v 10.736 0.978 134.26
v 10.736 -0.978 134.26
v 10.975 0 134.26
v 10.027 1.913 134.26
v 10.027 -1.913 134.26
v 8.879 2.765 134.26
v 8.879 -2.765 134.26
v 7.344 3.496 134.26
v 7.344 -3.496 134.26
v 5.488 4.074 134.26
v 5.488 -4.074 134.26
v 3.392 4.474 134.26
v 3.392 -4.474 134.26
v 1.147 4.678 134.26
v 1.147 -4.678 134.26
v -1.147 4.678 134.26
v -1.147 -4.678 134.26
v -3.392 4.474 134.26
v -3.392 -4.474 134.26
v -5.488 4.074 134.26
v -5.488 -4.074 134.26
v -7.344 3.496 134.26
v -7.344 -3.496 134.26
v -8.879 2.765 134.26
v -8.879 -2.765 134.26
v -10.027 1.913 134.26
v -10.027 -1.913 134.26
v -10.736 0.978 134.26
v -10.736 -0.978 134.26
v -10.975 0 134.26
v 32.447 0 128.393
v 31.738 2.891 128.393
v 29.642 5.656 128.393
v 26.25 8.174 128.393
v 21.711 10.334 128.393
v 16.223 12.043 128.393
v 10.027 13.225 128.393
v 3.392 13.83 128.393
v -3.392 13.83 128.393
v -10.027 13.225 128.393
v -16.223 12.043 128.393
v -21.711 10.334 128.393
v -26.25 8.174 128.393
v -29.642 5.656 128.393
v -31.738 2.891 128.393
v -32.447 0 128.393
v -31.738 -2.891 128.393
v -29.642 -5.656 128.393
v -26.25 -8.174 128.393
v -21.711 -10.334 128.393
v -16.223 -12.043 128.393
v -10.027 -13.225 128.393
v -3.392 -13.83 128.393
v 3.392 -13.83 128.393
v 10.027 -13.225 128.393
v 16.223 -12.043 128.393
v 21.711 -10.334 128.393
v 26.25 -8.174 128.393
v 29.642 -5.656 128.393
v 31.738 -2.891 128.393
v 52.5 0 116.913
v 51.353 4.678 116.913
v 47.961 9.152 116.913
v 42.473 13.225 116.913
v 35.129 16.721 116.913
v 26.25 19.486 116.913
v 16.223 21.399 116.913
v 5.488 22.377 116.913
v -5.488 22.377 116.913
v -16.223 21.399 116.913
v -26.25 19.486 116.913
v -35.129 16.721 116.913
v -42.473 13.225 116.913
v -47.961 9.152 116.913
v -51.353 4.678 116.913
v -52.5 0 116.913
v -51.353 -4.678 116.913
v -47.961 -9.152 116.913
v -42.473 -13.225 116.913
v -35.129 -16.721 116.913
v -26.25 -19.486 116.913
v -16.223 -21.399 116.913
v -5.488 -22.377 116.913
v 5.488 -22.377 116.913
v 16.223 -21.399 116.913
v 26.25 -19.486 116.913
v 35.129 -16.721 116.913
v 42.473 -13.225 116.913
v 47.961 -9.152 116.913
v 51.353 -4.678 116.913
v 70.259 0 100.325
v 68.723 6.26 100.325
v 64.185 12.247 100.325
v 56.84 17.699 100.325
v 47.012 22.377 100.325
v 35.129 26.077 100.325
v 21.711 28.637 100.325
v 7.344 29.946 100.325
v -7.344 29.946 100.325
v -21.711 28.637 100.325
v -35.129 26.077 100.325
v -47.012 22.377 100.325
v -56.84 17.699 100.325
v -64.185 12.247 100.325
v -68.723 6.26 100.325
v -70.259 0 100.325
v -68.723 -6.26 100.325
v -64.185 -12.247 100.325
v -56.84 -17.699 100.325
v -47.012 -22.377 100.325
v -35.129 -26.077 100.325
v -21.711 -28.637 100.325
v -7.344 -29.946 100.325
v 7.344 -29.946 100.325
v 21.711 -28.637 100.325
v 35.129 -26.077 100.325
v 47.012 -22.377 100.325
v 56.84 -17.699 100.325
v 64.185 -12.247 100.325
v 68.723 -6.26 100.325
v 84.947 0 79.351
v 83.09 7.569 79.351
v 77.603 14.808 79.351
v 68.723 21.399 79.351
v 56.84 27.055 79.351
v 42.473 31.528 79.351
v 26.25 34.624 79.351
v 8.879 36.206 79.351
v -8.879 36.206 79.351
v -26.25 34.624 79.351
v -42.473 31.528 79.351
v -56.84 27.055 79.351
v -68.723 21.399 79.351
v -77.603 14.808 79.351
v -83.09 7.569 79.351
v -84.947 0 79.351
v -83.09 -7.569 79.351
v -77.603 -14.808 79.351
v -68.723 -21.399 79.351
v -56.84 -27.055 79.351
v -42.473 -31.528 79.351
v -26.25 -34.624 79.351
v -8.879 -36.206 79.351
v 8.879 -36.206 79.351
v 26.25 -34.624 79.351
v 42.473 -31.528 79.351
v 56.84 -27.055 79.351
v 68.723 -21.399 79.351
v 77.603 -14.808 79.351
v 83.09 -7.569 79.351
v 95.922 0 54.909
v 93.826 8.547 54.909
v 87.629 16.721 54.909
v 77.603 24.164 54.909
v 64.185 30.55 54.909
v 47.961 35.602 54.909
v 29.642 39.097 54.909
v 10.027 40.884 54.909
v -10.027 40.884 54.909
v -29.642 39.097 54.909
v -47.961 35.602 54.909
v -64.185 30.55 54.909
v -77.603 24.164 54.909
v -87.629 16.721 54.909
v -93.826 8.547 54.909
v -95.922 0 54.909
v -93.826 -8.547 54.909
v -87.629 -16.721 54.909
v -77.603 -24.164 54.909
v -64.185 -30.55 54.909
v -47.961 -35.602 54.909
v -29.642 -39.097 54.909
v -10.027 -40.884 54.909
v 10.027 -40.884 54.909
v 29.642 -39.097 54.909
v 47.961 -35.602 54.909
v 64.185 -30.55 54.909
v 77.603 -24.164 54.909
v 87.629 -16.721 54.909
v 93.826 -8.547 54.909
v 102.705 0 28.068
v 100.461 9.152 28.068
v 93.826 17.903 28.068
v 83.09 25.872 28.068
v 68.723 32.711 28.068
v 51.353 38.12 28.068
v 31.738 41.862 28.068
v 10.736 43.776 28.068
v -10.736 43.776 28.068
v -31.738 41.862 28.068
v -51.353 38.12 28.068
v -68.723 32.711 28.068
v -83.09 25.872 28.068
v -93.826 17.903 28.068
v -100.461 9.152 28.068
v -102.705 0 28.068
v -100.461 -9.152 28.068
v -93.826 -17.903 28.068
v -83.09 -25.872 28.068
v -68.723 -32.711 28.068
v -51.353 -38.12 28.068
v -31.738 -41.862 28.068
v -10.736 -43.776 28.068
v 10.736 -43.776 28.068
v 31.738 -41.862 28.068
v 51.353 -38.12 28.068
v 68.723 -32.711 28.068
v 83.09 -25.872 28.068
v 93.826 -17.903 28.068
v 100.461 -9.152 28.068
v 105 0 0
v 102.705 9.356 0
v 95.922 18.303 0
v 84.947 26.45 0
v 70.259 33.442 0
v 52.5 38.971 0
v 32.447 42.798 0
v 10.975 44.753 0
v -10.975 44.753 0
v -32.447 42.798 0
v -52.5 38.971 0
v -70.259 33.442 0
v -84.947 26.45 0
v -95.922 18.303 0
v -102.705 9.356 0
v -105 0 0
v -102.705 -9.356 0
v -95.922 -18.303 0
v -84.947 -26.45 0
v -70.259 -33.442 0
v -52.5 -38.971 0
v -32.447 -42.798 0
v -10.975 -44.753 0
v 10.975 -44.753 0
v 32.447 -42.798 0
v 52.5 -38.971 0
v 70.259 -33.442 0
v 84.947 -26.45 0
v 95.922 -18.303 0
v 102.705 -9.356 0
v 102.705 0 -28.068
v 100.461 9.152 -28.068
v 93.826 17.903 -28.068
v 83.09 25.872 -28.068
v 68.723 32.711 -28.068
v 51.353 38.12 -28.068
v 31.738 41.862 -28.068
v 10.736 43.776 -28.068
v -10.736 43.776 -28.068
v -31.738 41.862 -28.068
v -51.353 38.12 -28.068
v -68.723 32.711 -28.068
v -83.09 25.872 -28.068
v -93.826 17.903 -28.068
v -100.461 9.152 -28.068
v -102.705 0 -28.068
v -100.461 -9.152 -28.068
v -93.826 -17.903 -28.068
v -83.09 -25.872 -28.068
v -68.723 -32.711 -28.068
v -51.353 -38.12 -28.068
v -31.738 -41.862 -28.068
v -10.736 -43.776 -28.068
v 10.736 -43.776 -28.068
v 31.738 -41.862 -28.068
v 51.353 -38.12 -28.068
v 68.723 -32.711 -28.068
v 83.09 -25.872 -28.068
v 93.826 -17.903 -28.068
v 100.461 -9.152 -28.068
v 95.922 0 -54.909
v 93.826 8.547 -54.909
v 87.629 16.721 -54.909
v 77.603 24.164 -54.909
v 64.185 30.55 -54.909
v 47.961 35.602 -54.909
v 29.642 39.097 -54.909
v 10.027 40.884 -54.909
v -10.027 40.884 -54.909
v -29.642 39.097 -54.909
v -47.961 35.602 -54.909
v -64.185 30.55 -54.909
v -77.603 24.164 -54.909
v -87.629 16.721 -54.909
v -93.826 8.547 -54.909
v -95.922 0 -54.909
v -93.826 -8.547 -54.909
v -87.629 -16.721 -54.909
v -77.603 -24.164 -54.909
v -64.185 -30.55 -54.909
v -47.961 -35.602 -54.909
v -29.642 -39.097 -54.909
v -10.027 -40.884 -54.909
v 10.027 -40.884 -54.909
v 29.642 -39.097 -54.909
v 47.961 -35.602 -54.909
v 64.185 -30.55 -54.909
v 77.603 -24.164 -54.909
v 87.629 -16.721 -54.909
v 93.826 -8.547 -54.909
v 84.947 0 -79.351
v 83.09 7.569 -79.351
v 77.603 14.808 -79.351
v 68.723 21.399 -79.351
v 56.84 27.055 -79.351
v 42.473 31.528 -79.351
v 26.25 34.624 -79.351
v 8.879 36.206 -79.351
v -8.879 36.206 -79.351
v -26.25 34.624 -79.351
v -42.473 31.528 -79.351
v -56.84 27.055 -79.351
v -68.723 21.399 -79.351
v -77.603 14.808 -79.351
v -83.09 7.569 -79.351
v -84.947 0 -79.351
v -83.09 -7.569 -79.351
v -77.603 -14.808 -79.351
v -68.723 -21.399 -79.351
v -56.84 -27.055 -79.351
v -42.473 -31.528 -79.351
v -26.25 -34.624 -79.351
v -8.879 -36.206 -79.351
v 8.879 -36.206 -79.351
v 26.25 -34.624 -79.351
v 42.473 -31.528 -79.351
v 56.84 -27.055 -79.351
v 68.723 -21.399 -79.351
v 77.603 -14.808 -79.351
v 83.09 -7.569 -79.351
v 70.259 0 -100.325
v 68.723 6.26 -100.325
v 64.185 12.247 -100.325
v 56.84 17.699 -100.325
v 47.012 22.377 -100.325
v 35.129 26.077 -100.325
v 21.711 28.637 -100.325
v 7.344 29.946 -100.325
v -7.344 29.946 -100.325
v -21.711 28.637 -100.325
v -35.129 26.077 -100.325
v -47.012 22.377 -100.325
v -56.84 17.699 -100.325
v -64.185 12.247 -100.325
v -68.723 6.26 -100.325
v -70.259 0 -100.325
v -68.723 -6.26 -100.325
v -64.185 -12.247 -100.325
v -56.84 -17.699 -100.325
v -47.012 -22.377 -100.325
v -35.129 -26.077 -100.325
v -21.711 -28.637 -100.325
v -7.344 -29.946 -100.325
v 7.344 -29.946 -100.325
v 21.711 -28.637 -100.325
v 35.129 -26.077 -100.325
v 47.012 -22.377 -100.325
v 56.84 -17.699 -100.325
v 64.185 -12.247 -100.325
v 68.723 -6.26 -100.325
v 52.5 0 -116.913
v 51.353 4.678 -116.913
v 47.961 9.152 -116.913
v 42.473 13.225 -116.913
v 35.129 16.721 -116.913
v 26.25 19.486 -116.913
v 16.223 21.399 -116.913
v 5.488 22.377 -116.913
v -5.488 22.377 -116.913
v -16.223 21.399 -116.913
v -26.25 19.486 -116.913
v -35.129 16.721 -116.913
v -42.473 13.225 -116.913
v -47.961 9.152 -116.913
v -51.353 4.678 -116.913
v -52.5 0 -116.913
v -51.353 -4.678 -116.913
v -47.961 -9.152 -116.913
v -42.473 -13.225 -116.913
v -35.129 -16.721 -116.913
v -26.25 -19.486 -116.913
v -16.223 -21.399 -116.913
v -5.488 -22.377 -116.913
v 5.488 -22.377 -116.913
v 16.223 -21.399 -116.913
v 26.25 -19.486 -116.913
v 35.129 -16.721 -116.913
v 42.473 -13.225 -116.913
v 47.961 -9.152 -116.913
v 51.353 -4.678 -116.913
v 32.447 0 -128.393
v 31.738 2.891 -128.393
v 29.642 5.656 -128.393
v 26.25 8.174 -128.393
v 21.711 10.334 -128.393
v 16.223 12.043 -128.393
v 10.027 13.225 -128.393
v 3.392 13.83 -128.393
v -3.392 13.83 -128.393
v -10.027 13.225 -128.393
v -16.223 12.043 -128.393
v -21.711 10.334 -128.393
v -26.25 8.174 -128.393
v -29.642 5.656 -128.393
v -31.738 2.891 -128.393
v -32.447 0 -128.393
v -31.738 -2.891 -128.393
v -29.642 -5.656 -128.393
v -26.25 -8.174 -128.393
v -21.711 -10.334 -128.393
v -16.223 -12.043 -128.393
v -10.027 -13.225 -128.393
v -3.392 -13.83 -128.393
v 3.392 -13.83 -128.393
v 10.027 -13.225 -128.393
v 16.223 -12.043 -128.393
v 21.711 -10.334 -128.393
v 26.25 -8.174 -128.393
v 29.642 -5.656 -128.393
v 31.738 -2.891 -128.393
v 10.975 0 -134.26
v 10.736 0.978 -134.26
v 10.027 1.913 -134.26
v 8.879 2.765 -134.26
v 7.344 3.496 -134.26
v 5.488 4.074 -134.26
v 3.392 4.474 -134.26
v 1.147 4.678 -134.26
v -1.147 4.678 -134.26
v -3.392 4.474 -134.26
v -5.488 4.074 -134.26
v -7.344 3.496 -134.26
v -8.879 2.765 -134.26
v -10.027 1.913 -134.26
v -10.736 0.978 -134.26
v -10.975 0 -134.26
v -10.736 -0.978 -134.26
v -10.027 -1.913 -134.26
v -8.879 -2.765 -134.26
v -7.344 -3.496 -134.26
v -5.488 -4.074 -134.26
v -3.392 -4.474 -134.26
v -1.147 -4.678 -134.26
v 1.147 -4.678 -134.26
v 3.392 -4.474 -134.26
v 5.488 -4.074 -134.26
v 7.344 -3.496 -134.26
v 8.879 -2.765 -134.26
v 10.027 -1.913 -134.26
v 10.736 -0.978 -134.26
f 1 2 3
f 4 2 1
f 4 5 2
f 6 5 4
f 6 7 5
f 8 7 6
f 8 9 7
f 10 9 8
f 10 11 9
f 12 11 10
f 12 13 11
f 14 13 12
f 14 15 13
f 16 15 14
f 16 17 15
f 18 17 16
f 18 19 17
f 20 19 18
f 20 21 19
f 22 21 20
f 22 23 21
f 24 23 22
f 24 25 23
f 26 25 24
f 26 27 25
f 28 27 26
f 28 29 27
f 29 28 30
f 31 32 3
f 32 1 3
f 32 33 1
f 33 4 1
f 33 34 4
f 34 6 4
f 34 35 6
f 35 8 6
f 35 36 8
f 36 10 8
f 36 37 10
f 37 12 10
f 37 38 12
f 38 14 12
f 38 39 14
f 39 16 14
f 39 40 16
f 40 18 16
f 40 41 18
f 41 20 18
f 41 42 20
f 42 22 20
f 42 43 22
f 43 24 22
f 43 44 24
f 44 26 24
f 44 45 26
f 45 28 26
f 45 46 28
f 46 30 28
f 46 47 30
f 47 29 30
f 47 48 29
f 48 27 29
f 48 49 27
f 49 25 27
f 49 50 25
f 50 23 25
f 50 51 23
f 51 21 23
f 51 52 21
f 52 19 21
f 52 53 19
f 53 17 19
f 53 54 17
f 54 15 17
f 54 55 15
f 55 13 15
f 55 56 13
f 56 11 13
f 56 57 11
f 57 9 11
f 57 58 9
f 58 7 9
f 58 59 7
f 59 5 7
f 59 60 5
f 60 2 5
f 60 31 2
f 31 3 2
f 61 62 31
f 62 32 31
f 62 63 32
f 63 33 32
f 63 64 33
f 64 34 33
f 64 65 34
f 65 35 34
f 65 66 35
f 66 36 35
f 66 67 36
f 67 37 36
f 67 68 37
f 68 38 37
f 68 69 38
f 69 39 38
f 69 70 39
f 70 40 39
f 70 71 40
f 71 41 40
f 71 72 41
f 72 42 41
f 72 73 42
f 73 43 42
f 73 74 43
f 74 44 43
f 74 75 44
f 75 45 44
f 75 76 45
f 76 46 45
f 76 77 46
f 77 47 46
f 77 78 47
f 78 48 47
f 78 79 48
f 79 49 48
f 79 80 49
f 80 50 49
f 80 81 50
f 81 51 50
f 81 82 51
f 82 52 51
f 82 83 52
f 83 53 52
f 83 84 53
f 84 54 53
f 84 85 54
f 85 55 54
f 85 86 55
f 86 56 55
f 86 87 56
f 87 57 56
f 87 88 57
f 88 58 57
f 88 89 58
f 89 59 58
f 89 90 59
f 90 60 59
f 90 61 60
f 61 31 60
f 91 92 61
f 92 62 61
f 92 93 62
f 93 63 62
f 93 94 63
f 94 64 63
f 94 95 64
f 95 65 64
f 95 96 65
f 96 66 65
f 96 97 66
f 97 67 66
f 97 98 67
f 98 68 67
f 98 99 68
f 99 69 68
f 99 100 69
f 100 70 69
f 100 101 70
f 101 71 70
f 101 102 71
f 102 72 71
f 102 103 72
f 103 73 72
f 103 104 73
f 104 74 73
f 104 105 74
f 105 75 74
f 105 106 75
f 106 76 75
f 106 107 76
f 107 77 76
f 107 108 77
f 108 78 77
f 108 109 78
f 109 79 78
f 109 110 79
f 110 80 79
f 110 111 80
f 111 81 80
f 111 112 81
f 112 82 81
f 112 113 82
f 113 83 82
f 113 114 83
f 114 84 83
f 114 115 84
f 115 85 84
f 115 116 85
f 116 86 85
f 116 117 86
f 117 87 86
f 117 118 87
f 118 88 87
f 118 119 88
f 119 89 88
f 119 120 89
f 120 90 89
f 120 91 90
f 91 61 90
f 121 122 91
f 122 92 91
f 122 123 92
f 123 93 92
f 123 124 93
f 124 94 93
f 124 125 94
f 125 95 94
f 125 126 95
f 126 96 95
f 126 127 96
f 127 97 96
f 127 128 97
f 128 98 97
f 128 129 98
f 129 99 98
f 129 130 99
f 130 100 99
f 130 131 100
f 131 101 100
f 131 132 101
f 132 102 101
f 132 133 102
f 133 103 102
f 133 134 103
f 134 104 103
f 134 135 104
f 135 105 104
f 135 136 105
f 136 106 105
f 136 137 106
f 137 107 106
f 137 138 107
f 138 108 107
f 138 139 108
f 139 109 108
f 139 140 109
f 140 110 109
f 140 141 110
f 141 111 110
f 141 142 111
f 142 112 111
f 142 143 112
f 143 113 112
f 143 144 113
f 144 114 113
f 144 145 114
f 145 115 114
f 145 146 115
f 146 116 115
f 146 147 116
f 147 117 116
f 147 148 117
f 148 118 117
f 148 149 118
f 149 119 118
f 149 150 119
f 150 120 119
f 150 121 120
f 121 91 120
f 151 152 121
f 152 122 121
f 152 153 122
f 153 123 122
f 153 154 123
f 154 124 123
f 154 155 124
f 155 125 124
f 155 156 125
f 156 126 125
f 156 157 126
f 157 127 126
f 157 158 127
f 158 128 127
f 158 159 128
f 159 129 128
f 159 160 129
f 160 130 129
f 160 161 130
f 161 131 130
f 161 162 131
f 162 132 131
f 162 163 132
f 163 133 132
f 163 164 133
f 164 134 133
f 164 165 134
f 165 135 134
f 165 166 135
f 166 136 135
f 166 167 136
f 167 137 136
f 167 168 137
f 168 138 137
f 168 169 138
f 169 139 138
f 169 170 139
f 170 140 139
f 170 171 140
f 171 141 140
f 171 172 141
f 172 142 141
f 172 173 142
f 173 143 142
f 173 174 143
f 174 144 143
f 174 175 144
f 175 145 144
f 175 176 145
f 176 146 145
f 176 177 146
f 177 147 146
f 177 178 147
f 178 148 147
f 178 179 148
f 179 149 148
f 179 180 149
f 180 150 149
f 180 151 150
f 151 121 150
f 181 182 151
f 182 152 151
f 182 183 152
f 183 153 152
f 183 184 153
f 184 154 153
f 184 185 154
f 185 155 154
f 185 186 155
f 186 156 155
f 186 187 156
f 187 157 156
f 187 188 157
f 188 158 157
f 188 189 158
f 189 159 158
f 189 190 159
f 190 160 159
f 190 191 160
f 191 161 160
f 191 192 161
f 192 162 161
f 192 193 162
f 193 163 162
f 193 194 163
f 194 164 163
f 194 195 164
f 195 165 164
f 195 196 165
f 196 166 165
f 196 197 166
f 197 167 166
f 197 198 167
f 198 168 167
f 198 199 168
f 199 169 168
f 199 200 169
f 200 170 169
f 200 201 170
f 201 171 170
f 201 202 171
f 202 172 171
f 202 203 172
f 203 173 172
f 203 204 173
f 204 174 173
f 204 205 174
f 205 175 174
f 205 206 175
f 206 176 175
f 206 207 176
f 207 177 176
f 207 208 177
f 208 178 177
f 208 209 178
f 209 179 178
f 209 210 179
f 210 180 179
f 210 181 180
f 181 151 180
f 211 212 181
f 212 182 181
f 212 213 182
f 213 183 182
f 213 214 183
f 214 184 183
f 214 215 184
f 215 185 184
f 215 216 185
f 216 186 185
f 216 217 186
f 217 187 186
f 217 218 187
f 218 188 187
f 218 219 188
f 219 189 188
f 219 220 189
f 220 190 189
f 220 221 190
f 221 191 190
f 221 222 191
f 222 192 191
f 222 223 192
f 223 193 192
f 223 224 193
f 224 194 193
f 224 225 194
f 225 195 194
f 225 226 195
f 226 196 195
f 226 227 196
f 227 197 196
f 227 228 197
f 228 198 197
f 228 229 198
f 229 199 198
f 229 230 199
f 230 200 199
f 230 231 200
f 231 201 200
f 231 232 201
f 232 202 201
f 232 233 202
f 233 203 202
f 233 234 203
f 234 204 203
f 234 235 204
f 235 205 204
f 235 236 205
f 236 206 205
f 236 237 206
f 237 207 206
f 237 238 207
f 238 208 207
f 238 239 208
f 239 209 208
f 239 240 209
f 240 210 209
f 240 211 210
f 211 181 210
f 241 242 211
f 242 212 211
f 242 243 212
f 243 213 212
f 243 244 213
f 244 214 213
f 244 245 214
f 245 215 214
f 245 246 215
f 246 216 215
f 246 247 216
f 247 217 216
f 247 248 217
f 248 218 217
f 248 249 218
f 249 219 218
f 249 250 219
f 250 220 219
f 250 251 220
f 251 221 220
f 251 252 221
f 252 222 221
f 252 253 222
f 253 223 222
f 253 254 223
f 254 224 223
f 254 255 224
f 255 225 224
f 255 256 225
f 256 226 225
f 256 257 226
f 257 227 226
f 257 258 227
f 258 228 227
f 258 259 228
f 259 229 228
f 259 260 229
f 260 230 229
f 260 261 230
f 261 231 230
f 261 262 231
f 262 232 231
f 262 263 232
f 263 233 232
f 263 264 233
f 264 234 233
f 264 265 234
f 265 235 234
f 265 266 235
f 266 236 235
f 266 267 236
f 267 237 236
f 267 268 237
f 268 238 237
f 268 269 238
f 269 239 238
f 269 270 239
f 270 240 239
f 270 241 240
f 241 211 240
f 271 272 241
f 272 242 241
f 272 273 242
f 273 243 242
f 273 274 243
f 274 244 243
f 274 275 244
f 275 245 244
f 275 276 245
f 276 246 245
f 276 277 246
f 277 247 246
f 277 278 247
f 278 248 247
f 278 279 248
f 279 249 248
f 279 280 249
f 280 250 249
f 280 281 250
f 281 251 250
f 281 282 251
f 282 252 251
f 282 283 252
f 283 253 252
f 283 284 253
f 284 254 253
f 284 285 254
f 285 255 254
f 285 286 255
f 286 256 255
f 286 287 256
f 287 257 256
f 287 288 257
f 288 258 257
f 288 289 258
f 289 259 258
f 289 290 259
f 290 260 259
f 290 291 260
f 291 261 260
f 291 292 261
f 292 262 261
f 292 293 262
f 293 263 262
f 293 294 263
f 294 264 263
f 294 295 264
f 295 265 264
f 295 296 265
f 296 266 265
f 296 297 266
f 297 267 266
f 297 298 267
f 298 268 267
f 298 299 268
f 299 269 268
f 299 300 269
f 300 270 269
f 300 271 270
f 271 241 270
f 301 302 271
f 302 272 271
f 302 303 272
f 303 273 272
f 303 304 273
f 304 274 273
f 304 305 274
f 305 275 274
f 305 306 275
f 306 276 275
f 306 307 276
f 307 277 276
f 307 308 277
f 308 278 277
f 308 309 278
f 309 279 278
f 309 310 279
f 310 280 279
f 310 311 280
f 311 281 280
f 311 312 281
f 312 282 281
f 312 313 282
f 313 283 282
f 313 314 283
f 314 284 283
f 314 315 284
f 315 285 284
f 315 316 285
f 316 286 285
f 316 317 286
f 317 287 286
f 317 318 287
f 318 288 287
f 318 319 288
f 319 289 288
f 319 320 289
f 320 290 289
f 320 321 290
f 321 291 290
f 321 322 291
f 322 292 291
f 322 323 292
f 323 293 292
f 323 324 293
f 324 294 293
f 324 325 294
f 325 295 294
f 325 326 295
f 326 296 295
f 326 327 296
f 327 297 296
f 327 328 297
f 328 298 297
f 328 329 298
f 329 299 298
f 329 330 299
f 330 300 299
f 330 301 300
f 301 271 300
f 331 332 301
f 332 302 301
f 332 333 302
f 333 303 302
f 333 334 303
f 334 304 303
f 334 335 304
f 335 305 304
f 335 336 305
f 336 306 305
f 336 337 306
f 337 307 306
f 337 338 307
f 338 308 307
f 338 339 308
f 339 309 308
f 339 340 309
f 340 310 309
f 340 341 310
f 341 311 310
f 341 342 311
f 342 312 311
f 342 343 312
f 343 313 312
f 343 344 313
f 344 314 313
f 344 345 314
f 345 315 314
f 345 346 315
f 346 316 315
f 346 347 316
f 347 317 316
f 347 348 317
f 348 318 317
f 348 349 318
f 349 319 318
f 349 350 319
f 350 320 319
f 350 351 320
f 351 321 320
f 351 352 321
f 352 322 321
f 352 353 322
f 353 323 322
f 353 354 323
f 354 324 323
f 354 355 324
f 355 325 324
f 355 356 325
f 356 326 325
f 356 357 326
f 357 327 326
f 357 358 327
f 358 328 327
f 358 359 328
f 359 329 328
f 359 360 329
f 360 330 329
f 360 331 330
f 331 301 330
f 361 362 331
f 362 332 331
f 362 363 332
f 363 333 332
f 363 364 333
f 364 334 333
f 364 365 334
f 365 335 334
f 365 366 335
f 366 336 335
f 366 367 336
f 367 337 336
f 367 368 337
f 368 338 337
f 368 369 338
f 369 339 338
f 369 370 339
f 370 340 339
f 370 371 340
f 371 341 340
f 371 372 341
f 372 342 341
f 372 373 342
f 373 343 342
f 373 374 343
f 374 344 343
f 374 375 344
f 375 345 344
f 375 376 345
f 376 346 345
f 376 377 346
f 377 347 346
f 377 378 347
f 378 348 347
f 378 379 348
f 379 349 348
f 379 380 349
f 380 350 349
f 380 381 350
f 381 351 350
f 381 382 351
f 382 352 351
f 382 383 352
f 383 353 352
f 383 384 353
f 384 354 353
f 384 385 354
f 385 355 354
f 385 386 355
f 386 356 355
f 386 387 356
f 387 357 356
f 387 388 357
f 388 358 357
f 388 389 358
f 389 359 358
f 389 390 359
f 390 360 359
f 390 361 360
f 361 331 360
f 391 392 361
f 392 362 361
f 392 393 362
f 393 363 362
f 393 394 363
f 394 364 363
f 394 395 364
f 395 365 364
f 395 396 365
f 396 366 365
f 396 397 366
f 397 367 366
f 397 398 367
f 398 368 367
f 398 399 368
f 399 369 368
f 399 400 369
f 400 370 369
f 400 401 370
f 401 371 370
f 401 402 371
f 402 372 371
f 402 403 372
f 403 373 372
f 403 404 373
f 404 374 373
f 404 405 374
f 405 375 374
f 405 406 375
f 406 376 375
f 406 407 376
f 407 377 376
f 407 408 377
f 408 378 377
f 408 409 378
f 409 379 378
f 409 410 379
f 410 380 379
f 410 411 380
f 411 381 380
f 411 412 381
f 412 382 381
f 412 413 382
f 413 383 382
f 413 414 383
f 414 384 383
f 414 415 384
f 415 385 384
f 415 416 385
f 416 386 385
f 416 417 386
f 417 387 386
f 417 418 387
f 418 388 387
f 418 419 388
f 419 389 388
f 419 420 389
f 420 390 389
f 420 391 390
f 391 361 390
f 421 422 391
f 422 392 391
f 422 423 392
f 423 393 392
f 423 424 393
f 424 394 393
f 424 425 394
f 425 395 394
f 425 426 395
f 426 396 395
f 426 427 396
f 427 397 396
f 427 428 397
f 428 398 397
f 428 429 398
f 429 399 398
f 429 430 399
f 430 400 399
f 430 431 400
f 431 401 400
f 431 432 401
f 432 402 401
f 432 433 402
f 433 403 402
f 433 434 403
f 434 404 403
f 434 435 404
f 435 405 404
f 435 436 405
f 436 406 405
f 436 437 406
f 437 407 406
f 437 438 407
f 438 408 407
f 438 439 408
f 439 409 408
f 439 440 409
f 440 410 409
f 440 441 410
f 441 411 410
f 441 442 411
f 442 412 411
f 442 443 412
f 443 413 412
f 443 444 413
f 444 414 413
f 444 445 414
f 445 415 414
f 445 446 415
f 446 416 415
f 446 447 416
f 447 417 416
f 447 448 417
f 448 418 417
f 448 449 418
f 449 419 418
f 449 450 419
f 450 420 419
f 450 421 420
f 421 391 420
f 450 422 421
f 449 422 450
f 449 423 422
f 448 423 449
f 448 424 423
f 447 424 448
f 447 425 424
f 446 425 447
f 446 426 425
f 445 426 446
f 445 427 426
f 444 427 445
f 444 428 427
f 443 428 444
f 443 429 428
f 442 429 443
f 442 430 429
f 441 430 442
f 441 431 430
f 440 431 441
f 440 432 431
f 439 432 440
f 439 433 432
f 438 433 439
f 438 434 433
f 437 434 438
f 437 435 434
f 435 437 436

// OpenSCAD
// Generated by SolidPython 1.0.1 on 2020-07-29 00:46:47


scale(v = [7, 3, 9]) {
	sphere(r = 15);
}
/***********************************************
*********      SolidPython code:      **********
************************************************
 
# import packages: SolidPython
from solid import *
from solid.utils import *
from itertools import chain, combinations, permutations


class Resize:

    def __init__(self, scad_file):
        self.scad_file = scad_file
        #self.scad_file = import_scad(scad_file)
        # cone/cylinder param:
        self.r1 = 0
        self.r2 = 0
        self.h = 0
        # rectangular prism param:
        self.w = 0
        self.l = 0
        # ellipse param:
        self.r = 0

    # import OpenScad code (file name corresponds to shape)


    # classify shape + parameters
    def assign(self, param1, param2, param3):
        if self.scad_file == 'cone.scad':
            self.r1 = param1
            self.r2 = param2
            self.h = param3
        elif self.scad_file == 'cylinder.scad':
            self.r1 = param1
            self.r2 = param2
            self.h = param3
        elif self.scad_file == 'rectangularPrism.scad':
            self.h = param1
            self.l = param2
            self.w = param3
        else:
            self.r = param1
            self.h = param2

    # resize parameters
    def iterate(self):
        x = range(3, 20, 2)
        i = 1
        if self.scad_file == 'cone.scad':
            tempList = list(permutations(x, 2))
            for temp in tempList:
                param1 = temp[0]
                param2 = temp[1]
                filepath = 'produced_scad_files/' + 'cone' + str(param1) + '_' + str(param2) + '_' + '.scad'
                scad_render_to_file(cylinder(h=param1, r1=param2, r2=0), filepath)

        elif self.scad_file == 'cylinder.scad':
            tempList = list(permutations(x, 3))
            for temp in tempList:
                param1 = temp[0]
                param2 = temp[1]
                filepath = 'produced_scad_files/' + 'cylinder' + str(param1) + '_' + str(param2) + '_' + '.scad'
                scad_render_to_file(cylinder(h=param1, r1=param2, r2=param2), filepath)

        elif self.scad_file == 'rectangularPrism.scad':
            tempList = list(permutations(x, 3))
            for temp in tempList:
                param1 = temp[0]
                param2 = temp[1]
                param3 = temp[2]
                filepath = 'produced_scad_files/' + 'rectangularPrism' + str(param1) + '_' + str(param2) + '_' + str(
                    param3) + '.scad'
                scad_render_to_file(cube(size=(param1, param2, param3)), filepath)

        elif self.scad_file == 'ellipse.scad':
            tempList = list(permutations(x, 4))
            for temp in tempList:
                param1 = temp[0]
                param2 = temp[1]
                param3 = temp[2]
                param4 = temp[3]
                filepath = 'produced_scad_files/' + 'ellipse' + str(param1) + '_' + str(param2) + '_' + str(param3) + '_' + str(param4) + '.scad'
                scad_render_to_file(scale([param1, param2, param3])(sphere(r=param4)), filepath)

    def render_to_scadfile(self):
        scad_render_to_file(scad, 'example.scad') 
 
************************************************/
